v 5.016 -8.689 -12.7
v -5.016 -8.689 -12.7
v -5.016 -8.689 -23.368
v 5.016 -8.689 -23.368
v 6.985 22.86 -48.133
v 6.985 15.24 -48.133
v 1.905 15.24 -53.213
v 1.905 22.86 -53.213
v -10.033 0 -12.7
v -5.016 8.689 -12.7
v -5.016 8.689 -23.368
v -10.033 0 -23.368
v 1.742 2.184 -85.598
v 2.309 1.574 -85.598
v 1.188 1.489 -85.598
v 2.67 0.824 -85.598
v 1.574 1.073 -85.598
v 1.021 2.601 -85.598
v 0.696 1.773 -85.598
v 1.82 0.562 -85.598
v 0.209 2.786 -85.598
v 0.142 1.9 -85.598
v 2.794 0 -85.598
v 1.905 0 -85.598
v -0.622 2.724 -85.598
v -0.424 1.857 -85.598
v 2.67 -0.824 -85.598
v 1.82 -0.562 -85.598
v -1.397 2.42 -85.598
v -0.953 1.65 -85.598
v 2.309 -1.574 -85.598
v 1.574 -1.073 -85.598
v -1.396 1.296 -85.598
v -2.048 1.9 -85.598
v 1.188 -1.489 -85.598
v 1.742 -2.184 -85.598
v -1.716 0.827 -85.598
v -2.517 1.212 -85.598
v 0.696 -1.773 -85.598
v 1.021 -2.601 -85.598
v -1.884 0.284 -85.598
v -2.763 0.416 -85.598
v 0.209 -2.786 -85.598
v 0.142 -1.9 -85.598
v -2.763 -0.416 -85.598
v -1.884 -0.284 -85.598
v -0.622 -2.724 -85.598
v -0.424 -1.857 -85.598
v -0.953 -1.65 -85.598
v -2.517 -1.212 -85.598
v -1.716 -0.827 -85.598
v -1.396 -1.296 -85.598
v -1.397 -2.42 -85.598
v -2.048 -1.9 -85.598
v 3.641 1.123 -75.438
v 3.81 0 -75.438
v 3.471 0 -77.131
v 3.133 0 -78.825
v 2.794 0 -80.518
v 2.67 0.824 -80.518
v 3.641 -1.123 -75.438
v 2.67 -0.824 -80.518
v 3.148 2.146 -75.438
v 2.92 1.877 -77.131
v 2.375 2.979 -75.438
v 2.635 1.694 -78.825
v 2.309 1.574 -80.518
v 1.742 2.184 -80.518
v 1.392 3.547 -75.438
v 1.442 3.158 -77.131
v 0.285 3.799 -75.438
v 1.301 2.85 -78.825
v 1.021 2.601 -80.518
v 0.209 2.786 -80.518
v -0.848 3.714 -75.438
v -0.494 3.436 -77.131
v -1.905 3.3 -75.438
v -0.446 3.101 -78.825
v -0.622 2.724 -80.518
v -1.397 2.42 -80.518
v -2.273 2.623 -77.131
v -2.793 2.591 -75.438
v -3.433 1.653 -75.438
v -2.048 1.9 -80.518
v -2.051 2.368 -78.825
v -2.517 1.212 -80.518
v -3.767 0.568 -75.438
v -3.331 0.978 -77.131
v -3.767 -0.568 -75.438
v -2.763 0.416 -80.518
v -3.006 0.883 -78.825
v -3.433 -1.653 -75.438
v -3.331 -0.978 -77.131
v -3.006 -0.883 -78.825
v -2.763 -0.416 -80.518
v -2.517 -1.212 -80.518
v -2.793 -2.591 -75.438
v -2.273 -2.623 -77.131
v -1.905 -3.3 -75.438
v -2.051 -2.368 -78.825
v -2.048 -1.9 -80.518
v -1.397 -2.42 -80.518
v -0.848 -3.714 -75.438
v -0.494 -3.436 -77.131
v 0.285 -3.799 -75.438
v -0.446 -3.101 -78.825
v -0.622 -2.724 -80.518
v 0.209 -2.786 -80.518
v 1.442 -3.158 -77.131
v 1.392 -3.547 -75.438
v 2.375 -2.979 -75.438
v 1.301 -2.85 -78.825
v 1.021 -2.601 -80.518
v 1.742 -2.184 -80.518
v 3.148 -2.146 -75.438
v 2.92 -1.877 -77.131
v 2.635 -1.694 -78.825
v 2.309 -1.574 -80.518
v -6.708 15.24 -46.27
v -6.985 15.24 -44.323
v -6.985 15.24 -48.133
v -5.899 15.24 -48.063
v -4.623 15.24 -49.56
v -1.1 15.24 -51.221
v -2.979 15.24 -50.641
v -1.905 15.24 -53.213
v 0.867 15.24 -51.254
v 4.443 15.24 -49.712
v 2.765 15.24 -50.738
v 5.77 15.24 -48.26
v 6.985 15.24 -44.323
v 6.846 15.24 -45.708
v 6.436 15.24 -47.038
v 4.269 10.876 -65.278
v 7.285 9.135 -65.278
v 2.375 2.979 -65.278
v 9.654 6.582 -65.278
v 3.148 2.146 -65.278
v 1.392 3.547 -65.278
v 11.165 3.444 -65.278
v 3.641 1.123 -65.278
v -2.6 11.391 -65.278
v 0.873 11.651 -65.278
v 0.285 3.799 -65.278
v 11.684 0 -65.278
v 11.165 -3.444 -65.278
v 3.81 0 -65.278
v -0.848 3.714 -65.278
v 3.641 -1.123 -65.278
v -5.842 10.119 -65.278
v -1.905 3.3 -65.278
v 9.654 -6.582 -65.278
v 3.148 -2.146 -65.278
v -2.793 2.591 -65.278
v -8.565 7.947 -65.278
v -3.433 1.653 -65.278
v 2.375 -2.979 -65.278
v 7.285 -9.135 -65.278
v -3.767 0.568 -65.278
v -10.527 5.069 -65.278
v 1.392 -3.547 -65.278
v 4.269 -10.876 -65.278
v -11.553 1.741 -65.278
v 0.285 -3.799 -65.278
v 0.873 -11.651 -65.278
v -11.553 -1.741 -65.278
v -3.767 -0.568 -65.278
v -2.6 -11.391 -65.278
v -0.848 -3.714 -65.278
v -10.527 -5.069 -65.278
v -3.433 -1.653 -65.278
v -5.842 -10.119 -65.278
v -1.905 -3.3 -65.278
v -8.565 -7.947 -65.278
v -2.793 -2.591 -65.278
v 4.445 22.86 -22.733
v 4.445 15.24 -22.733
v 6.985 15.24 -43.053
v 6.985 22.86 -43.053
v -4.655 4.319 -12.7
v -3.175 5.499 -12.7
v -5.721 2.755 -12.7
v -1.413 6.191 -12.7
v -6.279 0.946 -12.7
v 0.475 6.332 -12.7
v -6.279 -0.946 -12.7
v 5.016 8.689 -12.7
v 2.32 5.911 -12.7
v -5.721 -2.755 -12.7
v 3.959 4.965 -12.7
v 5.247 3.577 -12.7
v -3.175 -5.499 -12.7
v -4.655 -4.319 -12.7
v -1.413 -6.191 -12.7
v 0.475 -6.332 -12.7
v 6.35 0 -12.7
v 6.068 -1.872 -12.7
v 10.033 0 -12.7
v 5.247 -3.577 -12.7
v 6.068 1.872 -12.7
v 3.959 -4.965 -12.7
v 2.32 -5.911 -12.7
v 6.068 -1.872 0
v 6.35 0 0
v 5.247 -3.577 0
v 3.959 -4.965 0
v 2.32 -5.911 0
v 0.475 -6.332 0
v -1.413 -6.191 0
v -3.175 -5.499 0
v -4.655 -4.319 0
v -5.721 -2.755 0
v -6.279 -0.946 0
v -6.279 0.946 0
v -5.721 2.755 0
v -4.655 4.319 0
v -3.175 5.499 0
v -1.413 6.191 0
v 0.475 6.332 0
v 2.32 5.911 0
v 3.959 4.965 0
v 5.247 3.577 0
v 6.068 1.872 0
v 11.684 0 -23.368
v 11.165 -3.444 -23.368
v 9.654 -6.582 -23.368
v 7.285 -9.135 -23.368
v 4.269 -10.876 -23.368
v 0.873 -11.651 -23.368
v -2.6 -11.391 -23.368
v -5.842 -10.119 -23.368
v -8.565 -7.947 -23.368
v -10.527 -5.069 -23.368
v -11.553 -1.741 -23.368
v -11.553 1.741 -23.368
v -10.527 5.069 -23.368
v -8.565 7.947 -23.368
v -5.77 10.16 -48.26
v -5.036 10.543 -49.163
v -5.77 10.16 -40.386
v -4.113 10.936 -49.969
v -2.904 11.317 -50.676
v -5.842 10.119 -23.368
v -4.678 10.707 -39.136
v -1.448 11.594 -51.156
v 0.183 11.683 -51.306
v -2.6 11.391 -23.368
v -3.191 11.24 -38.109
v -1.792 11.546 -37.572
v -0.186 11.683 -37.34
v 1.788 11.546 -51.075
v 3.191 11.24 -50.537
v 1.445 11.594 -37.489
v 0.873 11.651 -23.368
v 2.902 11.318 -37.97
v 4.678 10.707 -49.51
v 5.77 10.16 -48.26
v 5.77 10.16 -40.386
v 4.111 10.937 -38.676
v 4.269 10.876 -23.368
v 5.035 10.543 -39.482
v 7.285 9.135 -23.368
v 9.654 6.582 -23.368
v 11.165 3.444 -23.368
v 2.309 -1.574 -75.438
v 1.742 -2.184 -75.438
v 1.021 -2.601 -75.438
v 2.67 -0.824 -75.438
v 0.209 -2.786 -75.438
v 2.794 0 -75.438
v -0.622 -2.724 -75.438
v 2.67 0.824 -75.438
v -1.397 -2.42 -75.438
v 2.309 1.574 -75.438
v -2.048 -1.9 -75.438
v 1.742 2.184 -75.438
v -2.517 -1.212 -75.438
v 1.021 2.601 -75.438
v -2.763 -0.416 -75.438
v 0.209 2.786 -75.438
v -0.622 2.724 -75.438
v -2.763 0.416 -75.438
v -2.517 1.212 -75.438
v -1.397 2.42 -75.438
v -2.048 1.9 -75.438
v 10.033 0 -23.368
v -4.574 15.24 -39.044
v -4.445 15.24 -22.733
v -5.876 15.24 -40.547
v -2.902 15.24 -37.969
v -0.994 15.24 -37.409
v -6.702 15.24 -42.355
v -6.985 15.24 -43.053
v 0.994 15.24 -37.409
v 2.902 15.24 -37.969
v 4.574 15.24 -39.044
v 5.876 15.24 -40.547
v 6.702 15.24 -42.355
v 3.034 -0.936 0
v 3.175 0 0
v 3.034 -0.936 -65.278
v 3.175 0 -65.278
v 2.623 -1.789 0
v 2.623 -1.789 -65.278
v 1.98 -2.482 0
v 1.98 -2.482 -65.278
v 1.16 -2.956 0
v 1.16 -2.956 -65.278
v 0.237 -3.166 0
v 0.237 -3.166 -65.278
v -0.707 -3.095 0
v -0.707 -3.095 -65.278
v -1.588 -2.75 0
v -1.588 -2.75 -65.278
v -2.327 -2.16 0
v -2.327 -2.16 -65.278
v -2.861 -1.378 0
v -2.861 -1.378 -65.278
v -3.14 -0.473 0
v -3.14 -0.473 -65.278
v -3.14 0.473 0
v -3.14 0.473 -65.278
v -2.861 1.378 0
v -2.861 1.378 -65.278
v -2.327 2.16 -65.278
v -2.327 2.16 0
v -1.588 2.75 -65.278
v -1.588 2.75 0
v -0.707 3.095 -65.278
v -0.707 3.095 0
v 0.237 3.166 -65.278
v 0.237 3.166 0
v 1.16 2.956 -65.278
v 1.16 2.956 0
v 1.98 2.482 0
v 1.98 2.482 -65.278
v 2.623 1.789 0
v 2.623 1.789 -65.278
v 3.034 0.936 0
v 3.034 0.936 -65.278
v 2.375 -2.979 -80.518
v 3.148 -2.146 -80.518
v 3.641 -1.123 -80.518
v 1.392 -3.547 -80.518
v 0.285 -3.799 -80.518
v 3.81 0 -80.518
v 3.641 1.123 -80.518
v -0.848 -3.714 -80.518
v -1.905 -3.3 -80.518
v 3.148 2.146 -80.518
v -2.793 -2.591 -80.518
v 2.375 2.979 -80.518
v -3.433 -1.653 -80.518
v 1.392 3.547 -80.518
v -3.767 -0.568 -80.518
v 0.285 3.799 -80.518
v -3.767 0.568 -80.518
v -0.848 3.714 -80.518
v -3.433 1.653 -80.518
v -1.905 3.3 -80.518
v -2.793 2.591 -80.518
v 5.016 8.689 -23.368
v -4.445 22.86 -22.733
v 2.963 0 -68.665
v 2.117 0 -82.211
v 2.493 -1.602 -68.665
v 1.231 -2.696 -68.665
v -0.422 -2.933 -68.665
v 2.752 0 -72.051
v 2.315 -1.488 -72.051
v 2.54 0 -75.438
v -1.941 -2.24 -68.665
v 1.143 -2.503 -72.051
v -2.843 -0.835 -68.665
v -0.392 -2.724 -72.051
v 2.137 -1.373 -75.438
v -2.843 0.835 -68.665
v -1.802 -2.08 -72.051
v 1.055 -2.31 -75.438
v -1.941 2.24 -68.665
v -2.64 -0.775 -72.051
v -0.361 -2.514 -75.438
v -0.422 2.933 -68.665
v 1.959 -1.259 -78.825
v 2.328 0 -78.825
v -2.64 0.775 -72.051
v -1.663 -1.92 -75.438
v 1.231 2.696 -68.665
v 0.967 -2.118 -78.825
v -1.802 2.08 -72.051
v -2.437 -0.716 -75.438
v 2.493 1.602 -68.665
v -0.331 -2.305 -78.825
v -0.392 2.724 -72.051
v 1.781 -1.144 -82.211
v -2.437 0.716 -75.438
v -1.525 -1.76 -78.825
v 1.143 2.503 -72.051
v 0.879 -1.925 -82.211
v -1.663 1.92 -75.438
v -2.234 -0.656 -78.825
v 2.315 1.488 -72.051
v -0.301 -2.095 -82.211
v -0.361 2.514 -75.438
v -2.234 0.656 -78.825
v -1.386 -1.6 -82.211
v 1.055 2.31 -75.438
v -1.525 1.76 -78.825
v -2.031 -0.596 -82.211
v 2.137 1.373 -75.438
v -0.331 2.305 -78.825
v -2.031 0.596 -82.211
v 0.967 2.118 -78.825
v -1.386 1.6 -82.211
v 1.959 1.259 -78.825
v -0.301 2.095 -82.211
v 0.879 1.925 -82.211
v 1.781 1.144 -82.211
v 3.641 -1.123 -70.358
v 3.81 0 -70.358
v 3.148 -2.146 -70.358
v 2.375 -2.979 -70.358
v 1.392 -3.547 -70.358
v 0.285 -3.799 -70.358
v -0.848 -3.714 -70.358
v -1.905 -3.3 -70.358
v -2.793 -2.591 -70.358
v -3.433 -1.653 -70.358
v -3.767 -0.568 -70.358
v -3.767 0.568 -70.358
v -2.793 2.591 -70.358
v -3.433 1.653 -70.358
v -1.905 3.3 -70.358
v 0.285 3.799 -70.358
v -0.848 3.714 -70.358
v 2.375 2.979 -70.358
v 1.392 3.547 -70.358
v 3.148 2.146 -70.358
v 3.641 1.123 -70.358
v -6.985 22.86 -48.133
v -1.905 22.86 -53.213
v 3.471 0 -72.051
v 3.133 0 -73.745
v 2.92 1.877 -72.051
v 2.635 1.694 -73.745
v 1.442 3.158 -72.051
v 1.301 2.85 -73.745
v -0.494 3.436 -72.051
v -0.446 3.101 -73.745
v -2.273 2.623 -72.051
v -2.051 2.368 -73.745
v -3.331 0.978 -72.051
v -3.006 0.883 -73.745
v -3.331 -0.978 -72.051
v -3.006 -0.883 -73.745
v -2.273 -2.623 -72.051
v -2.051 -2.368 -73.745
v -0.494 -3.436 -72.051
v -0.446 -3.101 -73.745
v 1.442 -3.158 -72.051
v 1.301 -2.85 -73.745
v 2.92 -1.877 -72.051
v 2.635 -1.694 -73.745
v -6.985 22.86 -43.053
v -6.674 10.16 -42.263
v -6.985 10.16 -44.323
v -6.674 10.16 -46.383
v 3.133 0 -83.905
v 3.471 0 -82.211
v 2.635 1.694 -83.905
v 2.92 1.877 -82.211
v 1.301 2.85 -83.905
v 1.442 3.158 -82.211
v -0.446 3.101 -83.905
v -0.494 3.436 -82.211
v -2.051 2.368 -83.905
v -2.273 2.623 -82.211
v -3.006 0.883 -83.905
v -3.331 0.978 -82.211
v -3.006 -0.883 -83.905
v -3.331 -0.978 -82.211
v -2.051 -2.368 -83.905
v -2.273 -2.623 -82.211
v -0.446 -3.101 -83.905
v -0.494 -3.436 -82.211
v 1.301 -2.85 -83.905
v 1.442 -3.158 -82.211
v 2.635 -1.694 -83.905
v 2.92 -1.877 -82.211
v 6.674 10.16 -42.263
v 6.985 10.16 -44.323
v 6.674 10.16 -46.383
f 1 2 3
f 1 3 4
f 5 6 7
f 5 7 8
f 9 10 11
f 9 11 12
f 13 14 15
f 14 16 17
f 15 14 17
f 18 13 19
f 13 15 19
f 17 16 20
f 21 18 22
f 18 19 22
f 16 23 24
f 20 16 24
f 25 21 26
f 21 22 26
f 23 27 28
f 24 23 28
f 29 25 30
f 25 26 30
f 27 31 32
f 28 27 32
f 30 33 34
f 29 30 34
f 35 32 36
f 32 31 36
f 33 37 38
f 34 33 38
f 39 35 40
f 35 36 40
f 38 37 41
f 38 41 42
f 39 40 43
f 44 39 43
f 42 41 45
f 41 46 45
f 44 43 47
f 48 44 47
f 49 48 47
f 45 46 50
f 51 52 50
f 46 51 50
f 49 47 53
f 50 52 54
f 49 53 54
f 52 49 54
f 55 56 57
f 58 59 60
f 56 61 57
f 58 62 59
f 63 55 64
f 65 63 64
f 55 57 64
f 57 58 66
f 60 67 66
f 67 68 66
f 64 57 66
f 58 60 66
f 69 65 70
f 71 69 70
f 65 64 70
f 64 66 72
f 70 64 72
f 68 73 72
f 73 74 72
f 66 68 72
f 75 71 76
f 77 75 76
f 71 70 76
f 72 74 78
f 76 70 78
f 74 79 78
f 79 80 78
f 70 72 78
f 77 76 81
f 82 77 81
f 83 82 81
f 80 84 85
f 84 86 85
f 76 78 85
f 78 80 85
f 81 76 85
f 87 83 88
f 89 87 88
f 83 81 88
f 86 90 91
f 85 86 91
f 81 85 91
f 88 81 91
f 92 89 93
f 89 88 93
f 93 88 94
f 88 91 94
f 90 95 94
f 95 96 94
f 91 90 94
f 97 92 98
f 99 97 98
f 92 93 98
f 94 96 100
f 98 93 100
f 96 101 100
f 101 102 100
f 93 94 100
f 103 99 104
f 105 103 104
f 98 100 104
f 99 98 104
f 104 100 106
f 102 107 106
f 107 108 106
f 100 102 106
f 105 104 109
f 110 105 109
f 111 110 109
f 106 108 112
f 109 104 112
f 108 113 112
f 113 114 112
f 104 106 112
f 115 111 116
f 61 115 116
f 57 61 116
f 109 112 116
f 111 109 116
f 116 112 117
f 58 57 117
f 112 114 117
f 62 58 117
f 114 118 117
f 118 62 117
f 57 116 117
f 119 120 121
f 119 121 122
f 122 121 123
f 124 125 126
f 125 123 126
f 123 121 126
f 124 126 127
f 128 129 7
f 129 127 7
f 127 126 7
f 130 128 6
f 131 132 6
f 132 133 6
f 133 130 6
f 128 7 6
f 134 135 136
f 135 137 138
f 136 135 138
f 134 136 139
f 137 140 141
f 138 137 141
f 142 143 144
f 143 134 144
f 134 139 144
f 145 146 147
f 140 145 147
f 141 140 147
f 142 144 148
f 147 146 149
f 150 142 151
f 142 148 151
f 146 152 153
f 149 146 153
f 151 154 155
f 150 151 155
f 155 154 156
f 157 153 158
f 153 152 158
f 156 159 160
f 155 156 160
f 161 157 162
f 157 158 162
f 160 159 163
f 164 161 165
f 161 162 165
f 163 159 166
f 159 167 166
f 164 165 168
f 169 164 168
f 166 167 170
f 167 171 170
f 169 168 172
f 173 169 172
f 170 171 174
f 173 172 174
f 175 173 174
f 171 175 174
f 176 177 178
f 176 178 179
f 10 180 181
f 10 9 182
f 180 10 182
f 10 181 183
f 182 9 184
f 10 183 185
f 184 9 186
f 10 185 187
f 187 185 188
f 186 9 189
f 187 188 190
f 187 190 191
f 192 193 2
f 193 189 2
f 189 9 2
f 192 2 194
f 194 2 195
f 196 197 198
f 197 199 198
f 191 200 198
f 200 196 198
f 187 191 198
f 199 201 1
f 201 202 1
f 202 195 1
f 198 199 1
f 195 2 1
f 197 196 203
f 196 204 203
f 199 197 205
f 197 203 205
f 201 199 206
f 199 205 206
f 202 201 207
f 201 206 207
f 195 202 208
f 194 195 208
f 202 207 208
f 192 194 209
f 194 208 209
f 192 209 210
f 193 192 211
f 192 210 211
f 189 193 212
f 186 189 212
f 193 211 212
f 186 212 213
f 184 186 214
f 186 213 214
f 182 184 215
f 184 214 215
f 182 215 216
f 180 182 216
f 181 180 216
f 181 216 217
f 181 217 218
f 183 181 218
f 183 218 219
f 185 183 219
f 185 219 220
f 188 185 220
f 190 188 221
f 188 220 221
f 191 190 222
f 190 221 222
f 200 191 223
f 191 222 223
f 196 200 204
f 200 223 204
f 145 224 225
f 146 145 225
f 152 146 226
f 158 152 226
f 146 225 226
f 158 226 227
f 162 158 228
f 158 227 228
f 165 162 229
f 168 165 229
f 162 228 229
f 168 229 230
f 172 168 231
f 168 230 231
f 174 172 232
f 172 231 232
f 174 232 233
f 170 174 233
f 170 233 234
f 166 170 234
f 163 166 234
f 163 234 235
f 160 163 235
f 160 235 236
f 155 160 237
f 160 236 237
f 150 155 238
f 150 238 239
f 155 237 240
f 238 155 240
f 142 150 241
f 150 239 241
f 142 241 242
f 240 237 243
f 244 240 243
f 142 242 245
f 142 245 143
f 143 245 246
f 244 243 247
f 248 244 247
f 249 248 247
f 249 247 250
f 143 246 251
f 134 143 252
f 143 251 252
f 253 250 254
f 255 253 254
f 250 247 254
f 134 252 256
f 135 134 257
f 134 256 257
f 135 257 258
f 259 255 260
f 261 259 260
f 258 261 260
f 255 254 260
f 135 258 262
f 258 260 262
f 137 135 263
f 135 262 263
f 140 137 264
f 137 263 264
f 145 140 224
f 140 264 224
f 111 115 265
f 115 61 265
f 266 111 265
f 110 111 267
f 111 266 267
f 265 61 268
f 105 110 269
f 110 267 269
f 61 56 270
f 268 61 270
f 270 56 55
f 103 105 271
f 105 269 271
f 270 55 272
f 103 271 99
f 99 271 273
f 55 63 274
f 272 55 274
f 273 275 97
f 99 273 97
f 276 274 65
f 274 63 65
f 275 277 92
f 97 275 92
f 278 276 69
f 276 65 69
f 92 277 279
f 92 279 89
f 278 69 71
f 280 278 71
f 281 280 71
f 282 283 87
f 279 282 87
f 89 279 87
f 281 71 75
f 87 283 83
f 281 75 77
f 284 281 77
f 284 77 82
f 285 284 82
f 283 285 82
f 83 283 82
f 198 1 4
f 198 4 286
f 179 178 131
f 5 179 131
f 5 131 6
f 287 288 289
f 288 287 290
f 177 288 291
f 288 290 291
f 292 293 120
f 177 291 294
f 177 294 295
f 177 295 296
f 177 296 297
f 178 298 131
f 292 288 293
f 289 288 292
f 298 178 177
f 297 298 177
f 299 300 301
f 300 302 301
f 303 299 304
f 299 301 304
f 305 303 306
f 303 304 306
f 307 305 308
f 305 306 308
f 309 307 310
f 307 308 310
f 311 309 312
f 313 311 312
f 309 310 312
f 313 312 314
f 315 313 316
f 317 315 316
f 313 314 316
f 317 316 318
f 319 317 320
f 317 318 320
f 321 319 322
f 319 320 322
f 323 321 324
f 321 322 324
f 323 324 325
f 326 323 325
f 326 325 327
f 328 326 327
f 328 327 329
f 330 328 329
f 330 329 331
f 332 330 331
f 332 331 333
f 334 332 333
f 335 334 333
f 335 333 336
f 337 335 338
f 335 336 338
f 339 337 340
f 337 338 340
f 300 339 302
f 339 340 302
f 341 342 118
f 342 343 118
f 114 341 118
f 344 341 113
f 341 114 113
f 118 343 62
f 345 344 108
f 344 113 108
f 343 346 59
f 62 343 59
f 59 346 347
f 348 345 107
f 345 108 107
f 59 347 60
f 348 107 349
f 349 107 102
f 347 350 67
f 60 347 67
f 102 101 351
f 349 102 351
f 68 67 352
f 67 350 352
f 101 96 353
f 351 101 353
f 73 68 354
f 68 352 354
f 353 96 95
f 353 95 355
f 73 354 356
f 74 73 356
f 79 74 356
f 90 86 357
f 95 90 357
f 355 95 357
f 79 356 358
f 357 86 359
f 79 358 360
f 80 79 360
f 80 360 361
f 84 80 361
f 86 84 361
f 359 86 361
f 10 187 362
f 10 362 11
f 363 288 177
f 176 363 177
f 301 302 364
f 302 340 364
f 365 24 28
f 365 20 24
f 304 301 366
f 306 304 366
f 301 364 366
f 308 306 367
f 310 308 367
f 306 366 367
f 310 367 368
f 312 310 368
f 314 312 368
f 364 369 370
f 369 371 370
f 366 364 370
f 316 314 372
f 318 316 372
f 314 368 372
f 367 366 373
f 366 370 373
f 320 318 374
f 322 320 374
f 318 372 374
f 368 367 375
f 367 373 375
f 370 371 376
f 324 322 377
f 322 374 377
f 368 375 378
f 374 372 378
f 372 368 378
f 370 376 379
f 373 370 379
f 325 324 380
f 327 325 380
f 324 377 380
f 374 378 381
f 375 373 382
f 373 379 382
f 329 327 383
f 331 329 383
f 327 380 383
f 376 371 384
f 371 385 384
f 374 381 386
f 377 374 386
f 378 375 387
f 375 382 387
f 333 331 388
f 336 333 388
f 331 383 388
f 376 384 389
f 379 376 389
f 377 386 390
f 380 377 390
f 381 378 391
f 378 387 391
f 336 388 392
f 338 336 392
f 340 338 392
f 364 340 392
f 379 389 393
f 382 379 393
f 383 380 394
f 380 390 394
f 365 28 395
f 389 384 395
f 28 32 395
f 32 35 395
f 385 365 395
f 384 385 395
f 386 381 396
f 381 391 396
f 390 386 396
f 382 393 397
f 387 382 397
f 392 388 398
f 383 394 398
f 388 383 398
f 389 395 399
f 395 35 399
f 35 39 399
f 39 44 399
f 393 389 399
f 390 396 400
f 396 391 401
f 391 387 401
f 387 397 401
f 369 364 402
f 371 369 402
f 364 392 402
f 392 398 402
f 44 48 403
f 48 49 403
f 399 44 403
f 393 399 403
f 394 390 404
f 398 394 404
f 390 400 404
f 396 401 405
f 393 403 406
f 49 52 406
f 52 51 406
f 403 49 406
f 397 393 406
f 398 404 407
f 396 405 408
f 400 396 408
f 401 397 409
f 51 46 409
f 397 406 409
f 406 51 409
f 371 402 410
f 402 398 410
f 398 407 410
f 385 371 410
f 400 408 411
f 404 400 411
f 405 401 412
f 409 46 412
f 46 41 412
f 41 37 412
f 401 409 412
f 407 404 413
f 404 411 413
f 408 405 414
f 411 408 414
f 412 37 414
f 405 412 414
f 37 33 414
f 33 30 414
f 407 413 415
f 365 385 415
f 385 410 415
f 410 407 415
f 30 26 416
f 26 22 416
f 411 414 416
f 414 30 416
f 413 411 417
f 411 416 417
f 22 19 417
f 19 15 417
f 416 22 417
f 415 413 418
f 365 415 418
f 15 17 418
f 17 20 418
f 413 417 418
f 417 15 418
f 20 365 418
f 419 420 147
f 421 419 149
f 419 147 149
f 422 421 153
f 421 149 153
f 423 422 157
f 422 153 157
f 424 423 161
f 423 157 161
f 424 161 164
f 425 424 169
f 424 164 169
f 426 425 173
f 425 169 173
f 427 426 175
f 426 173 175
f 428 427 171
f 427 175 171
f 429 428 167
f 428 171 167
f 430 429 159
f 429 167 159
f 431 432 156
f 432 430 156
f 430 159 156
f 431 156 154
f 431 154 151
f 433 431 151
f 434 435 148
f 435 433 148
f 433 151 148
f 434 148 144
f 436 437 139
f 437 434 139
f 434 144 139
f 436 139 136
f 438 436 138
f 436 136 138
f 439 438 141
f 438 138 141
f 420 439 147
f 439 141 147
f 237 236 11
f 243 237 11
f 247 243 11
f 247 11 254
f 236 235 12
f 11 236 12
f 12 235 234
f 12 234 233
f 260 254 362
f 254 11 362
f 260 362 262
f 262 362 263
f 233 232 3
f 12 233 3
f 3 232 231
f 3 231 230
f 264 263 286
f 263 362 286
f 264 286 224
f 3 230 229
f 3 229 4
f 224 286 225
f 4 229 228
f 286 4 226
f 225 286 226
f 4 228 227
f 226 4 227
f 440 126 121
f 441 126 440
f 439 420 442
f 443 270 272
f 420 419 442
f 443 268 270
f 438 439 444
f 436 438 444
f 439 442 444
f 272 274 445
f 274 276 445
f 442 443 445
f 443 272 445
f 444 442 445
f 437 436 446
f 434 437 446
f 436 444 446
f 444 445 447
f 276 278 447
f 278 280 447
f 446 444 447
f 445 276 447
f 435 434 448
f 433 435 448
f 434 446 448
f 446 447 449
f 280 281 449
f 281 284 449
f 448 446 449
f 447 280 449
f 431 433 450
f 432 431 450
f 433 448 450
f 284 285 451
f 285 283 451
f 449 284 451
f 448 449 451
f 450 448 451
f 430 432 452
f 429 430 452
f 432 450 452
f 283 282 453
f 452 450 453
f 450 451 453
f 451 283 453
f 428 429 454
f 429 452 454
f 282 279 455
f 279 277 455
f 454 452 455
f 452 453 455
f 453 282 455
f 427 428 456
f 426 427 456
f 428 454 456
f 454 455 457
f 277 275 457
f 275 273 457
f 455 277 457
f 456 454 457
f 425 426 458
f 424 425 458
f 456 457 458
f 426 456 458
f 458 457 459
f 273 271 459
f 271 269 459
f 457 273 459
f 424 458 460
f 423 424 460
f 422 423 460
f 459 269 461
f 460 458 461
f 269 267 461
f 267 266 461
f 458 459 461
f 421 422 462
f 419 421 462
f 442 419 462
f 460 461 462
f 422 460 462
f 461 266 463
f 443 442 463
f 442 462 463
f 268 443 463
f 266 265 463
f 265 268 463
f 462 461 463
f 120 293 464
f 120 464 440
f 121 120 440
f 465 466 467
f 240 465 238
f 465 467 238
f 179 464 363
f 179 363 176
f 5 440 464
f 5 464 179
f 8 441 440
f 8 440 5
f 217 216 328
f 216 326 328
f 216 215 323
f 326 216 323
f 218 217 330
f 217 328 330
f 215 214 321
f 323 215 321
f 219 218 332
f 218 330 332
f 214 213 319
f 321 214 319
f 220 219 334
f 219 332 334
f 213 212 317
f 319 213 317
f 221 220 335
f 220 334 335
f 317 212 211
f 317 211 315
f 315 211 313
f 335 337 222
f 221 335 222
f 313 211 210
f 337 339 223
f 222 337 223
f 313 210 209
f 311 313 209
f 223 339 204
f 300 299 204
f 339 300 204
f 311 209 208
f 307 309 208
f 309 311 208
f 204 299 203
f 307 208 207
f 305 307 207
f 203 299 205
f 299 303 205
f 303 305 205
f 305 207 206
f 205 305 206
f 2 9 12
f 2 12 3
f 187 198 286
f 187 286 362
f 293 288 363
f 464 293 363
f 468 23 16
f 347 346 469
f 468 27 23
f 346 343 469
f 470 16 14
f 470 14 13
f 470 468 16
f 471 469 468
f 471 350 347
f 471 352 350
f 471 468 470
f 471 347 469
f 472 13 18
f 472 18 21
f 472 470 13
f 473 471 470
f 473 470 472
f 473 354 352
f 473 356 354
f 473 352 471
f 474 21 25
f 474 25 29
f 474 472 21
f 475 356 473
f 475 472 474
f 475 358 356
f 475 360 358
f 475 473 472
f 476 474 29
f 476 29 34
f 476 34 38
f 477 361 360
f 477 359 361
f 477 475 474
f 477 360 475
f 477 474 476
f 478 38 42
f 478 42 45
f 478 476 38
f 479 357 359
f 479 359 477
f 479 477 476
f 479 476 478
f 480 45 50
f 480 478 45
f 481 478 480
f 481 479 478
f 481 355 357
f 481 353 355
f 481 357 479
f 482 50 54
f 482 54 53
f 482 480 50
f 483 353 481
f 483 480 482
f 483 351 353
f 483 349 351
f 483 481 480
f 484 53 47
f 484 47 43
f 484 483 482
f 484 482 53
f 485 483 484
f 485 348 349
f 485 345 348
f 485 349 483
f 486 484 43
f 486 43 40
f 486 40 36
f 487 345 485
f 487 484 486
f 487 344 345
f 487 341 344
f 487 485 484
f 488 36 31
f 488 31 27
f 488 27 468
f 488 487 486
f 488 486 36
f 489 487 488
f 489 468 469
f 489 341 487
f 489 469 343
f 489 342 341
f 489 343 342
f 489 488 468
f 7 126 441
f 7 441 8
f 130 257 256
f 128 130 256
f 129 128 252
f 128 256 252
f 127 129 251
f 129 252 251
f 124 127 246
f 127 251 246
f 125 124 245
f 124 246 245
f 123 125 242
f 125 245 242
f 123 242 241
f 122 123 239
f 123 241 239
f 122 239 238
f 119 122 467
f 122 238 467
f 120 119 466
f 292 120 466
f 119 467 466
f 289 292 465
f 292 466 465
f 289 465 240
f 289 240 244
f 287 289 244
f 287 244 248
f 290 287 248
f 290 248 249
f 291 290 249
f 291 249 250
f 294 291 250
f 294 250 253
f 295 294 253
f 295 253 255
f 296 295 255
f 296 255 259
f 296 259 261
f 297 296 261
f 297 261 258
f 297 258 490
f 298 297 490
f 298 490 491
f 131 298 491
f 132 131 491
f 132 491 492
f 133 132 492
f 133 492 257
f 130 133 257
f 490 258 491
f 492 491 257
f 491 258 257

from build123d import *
from OCP.BRepFilletAPI import BRepFilletAPI_MakeChamfer

# Parameters (mm, degrees)
SKETCH3_R           = 10.16
CUT_EXTRUDE1_DEPTH  = 10.668
SKETCH4_R           = 6.985
BOSS_EXTRUDE1_DEPTH = 5.08
SKETCH5_W           = 13.97
SKETCH5_H           = 30.48
BOSS_EXTRUDE2_DEPTH = 7.62
CHAMFER1_SIZE       = 5.08
CHAMFER2_SIZE       = 20.32
CHAMFER2_SIZE2      = 2.54


# Read off the part's stored shape, not the designer's step: LPattern8
with BuildPart() as part:
    # Sketch1 → Revolve1 (revolve)
    with BuildSketch(Plane(origin=(0, 0, 0), x_dir=(1, 0, 0), z_dir=(0, 1, 0))):
        Polygon((3.81, 85.598), (3.81, 65.278), (11.684, 65.278), (11.684, 23.368), (10.16, 23.368), (10.16, 12.7), (6.35, 12.7), (6.35, 0), (3.175, 0), (3.175, 65.278), (1.905, 85.598), align=None)
    revolve(axis=Axis((0, 0, 0), (0, 0, -1)))

    # Sketch2 → Cut-Revolve1 (revolve, cut)
    with BuildSketch(Plane(origin=(0, 0, 0), x_dir=(1, 0, 0), z_dir=(0, 1, 0))):
        Polygon((3.81, 85.598), (2.794, 85.598), (3.81, 80.518), align=None)
    revolve(axis=Axis((0, 0, 0), (0, 0, 1)), mode=Mode.SUBTRACT)

    # LPattern8 outline → LPattern8 (revolve, cut)
    with BuildSketch(Plane.XZ):
        Polygon((3.81, -75.438), (2.794, -80.518), (3.81, -80.518), align=None)
        Polygon((2.794, -75.438), (3.81, -75.438), (3.81, -70.358), align=None)
    revolve(axis=Axis((0, 0, 0), (0, 0, 1)), mode=Mode.SUBTRACT)

    # Sketch3 → Cut-Extrude1 (cut)
    with BuildSketch(Plane.XY.offset(-12.7)):
        Circle(SKETCH3_R)
        Polygon((5.0165, -8.688832876), (10.033, 0), (5.0165, 8.688832876), (-5.0165, 8.688832876), (-10.033, 0), (-5.0165, -8.688832876), align=None, mode=Mode.SUBTRACT)
    extrude(amount=-CUT_EXTRUDE1_DEPTH, mode=Mode.SUBTRACT)

    # Sketch4 → Boss-Extrude1 (add)
    with BuildSketch(Plane(origin=(0, 10.16, 0), x_dir=(1, 0, 0), z_dir=(0, 1, 0))):
        with Locations(Location((0, 44.323, 0), (0, 0, 34.307651456))):
            Circle(SKETCH4_R)
    extrude(amount=BOSS_EXTRUDE1_DEPTH)

    # Sketch5 → Boss-Extrude2 (add)
    with BuildSketch(Plane(origin=(0, 15.24, 0), x_dir=(1, 0, 0), z_dir=(0, 1, 0))):
        with Locations((0, 37.973)):
            Rectangle(SKETCH5_W, SKETCH5_H)
    extrude(amount=BOSS_EXTRUDE2_DEPTH)

    # Chamfer1
    chamfer1_edges = [part.edges().sort_by_distance(p)[0] for p in [
        (-6.985, 19.05, -53.213),
        (6.985, 19.05, -53.213),
    ]]
    chamfer(chamfer1_edges, length=CHAMFER1_SIZE)

    # Chamfer2: one chamfer whose edges measure the first distance from different faces: ONE call of the kernel's chamfer builder (chamfer() names one face for all edges)
    chamfer2_edges_1 = [part.edges().sort_by_distance(p)[0] for p in [
        (-6.985, 19.05, -22.733),
    ]]
    chamfer2_side_1 = [part.faces().sort_by_distance(p)[0] for p in [
        (-6.985, 19.05, -35.433),
    ]]
    chamfer2_edges_2 = [part.edges().sort_by_distance(p)[0] for p in [
        (6.985, 19.05, -22.733),
    ]]
    chamfer2_side_2 = [part.faces().sort_by_distance(p)[0] for p in [
        (6.985, 19.05, -35.433),
    ]]
    chamfer2 = BRepFilletAPI_MakeChamfer(part.part.solid().wrapped)
    for e in chamfer2_edges_1:
        chamfer2.Add(CHAMFER2_SIZE, CHAMFER2_SIZE2, e.wrapped, chamfer2_side_1[0].wrapped)  # the first distance lies on this face
    for e in chamfer2_edges_2:
        chamfer2.Add(CHAMFER2_SIZE, CHAMFER2_SIZE2, e.wrapped, chamfer2_side_2[0].wrapped)  # the first distance lies on this face
    add(Compound.cast(chamfer2.Shape()), mode=Mode.REPLACE)


solid = part.part
